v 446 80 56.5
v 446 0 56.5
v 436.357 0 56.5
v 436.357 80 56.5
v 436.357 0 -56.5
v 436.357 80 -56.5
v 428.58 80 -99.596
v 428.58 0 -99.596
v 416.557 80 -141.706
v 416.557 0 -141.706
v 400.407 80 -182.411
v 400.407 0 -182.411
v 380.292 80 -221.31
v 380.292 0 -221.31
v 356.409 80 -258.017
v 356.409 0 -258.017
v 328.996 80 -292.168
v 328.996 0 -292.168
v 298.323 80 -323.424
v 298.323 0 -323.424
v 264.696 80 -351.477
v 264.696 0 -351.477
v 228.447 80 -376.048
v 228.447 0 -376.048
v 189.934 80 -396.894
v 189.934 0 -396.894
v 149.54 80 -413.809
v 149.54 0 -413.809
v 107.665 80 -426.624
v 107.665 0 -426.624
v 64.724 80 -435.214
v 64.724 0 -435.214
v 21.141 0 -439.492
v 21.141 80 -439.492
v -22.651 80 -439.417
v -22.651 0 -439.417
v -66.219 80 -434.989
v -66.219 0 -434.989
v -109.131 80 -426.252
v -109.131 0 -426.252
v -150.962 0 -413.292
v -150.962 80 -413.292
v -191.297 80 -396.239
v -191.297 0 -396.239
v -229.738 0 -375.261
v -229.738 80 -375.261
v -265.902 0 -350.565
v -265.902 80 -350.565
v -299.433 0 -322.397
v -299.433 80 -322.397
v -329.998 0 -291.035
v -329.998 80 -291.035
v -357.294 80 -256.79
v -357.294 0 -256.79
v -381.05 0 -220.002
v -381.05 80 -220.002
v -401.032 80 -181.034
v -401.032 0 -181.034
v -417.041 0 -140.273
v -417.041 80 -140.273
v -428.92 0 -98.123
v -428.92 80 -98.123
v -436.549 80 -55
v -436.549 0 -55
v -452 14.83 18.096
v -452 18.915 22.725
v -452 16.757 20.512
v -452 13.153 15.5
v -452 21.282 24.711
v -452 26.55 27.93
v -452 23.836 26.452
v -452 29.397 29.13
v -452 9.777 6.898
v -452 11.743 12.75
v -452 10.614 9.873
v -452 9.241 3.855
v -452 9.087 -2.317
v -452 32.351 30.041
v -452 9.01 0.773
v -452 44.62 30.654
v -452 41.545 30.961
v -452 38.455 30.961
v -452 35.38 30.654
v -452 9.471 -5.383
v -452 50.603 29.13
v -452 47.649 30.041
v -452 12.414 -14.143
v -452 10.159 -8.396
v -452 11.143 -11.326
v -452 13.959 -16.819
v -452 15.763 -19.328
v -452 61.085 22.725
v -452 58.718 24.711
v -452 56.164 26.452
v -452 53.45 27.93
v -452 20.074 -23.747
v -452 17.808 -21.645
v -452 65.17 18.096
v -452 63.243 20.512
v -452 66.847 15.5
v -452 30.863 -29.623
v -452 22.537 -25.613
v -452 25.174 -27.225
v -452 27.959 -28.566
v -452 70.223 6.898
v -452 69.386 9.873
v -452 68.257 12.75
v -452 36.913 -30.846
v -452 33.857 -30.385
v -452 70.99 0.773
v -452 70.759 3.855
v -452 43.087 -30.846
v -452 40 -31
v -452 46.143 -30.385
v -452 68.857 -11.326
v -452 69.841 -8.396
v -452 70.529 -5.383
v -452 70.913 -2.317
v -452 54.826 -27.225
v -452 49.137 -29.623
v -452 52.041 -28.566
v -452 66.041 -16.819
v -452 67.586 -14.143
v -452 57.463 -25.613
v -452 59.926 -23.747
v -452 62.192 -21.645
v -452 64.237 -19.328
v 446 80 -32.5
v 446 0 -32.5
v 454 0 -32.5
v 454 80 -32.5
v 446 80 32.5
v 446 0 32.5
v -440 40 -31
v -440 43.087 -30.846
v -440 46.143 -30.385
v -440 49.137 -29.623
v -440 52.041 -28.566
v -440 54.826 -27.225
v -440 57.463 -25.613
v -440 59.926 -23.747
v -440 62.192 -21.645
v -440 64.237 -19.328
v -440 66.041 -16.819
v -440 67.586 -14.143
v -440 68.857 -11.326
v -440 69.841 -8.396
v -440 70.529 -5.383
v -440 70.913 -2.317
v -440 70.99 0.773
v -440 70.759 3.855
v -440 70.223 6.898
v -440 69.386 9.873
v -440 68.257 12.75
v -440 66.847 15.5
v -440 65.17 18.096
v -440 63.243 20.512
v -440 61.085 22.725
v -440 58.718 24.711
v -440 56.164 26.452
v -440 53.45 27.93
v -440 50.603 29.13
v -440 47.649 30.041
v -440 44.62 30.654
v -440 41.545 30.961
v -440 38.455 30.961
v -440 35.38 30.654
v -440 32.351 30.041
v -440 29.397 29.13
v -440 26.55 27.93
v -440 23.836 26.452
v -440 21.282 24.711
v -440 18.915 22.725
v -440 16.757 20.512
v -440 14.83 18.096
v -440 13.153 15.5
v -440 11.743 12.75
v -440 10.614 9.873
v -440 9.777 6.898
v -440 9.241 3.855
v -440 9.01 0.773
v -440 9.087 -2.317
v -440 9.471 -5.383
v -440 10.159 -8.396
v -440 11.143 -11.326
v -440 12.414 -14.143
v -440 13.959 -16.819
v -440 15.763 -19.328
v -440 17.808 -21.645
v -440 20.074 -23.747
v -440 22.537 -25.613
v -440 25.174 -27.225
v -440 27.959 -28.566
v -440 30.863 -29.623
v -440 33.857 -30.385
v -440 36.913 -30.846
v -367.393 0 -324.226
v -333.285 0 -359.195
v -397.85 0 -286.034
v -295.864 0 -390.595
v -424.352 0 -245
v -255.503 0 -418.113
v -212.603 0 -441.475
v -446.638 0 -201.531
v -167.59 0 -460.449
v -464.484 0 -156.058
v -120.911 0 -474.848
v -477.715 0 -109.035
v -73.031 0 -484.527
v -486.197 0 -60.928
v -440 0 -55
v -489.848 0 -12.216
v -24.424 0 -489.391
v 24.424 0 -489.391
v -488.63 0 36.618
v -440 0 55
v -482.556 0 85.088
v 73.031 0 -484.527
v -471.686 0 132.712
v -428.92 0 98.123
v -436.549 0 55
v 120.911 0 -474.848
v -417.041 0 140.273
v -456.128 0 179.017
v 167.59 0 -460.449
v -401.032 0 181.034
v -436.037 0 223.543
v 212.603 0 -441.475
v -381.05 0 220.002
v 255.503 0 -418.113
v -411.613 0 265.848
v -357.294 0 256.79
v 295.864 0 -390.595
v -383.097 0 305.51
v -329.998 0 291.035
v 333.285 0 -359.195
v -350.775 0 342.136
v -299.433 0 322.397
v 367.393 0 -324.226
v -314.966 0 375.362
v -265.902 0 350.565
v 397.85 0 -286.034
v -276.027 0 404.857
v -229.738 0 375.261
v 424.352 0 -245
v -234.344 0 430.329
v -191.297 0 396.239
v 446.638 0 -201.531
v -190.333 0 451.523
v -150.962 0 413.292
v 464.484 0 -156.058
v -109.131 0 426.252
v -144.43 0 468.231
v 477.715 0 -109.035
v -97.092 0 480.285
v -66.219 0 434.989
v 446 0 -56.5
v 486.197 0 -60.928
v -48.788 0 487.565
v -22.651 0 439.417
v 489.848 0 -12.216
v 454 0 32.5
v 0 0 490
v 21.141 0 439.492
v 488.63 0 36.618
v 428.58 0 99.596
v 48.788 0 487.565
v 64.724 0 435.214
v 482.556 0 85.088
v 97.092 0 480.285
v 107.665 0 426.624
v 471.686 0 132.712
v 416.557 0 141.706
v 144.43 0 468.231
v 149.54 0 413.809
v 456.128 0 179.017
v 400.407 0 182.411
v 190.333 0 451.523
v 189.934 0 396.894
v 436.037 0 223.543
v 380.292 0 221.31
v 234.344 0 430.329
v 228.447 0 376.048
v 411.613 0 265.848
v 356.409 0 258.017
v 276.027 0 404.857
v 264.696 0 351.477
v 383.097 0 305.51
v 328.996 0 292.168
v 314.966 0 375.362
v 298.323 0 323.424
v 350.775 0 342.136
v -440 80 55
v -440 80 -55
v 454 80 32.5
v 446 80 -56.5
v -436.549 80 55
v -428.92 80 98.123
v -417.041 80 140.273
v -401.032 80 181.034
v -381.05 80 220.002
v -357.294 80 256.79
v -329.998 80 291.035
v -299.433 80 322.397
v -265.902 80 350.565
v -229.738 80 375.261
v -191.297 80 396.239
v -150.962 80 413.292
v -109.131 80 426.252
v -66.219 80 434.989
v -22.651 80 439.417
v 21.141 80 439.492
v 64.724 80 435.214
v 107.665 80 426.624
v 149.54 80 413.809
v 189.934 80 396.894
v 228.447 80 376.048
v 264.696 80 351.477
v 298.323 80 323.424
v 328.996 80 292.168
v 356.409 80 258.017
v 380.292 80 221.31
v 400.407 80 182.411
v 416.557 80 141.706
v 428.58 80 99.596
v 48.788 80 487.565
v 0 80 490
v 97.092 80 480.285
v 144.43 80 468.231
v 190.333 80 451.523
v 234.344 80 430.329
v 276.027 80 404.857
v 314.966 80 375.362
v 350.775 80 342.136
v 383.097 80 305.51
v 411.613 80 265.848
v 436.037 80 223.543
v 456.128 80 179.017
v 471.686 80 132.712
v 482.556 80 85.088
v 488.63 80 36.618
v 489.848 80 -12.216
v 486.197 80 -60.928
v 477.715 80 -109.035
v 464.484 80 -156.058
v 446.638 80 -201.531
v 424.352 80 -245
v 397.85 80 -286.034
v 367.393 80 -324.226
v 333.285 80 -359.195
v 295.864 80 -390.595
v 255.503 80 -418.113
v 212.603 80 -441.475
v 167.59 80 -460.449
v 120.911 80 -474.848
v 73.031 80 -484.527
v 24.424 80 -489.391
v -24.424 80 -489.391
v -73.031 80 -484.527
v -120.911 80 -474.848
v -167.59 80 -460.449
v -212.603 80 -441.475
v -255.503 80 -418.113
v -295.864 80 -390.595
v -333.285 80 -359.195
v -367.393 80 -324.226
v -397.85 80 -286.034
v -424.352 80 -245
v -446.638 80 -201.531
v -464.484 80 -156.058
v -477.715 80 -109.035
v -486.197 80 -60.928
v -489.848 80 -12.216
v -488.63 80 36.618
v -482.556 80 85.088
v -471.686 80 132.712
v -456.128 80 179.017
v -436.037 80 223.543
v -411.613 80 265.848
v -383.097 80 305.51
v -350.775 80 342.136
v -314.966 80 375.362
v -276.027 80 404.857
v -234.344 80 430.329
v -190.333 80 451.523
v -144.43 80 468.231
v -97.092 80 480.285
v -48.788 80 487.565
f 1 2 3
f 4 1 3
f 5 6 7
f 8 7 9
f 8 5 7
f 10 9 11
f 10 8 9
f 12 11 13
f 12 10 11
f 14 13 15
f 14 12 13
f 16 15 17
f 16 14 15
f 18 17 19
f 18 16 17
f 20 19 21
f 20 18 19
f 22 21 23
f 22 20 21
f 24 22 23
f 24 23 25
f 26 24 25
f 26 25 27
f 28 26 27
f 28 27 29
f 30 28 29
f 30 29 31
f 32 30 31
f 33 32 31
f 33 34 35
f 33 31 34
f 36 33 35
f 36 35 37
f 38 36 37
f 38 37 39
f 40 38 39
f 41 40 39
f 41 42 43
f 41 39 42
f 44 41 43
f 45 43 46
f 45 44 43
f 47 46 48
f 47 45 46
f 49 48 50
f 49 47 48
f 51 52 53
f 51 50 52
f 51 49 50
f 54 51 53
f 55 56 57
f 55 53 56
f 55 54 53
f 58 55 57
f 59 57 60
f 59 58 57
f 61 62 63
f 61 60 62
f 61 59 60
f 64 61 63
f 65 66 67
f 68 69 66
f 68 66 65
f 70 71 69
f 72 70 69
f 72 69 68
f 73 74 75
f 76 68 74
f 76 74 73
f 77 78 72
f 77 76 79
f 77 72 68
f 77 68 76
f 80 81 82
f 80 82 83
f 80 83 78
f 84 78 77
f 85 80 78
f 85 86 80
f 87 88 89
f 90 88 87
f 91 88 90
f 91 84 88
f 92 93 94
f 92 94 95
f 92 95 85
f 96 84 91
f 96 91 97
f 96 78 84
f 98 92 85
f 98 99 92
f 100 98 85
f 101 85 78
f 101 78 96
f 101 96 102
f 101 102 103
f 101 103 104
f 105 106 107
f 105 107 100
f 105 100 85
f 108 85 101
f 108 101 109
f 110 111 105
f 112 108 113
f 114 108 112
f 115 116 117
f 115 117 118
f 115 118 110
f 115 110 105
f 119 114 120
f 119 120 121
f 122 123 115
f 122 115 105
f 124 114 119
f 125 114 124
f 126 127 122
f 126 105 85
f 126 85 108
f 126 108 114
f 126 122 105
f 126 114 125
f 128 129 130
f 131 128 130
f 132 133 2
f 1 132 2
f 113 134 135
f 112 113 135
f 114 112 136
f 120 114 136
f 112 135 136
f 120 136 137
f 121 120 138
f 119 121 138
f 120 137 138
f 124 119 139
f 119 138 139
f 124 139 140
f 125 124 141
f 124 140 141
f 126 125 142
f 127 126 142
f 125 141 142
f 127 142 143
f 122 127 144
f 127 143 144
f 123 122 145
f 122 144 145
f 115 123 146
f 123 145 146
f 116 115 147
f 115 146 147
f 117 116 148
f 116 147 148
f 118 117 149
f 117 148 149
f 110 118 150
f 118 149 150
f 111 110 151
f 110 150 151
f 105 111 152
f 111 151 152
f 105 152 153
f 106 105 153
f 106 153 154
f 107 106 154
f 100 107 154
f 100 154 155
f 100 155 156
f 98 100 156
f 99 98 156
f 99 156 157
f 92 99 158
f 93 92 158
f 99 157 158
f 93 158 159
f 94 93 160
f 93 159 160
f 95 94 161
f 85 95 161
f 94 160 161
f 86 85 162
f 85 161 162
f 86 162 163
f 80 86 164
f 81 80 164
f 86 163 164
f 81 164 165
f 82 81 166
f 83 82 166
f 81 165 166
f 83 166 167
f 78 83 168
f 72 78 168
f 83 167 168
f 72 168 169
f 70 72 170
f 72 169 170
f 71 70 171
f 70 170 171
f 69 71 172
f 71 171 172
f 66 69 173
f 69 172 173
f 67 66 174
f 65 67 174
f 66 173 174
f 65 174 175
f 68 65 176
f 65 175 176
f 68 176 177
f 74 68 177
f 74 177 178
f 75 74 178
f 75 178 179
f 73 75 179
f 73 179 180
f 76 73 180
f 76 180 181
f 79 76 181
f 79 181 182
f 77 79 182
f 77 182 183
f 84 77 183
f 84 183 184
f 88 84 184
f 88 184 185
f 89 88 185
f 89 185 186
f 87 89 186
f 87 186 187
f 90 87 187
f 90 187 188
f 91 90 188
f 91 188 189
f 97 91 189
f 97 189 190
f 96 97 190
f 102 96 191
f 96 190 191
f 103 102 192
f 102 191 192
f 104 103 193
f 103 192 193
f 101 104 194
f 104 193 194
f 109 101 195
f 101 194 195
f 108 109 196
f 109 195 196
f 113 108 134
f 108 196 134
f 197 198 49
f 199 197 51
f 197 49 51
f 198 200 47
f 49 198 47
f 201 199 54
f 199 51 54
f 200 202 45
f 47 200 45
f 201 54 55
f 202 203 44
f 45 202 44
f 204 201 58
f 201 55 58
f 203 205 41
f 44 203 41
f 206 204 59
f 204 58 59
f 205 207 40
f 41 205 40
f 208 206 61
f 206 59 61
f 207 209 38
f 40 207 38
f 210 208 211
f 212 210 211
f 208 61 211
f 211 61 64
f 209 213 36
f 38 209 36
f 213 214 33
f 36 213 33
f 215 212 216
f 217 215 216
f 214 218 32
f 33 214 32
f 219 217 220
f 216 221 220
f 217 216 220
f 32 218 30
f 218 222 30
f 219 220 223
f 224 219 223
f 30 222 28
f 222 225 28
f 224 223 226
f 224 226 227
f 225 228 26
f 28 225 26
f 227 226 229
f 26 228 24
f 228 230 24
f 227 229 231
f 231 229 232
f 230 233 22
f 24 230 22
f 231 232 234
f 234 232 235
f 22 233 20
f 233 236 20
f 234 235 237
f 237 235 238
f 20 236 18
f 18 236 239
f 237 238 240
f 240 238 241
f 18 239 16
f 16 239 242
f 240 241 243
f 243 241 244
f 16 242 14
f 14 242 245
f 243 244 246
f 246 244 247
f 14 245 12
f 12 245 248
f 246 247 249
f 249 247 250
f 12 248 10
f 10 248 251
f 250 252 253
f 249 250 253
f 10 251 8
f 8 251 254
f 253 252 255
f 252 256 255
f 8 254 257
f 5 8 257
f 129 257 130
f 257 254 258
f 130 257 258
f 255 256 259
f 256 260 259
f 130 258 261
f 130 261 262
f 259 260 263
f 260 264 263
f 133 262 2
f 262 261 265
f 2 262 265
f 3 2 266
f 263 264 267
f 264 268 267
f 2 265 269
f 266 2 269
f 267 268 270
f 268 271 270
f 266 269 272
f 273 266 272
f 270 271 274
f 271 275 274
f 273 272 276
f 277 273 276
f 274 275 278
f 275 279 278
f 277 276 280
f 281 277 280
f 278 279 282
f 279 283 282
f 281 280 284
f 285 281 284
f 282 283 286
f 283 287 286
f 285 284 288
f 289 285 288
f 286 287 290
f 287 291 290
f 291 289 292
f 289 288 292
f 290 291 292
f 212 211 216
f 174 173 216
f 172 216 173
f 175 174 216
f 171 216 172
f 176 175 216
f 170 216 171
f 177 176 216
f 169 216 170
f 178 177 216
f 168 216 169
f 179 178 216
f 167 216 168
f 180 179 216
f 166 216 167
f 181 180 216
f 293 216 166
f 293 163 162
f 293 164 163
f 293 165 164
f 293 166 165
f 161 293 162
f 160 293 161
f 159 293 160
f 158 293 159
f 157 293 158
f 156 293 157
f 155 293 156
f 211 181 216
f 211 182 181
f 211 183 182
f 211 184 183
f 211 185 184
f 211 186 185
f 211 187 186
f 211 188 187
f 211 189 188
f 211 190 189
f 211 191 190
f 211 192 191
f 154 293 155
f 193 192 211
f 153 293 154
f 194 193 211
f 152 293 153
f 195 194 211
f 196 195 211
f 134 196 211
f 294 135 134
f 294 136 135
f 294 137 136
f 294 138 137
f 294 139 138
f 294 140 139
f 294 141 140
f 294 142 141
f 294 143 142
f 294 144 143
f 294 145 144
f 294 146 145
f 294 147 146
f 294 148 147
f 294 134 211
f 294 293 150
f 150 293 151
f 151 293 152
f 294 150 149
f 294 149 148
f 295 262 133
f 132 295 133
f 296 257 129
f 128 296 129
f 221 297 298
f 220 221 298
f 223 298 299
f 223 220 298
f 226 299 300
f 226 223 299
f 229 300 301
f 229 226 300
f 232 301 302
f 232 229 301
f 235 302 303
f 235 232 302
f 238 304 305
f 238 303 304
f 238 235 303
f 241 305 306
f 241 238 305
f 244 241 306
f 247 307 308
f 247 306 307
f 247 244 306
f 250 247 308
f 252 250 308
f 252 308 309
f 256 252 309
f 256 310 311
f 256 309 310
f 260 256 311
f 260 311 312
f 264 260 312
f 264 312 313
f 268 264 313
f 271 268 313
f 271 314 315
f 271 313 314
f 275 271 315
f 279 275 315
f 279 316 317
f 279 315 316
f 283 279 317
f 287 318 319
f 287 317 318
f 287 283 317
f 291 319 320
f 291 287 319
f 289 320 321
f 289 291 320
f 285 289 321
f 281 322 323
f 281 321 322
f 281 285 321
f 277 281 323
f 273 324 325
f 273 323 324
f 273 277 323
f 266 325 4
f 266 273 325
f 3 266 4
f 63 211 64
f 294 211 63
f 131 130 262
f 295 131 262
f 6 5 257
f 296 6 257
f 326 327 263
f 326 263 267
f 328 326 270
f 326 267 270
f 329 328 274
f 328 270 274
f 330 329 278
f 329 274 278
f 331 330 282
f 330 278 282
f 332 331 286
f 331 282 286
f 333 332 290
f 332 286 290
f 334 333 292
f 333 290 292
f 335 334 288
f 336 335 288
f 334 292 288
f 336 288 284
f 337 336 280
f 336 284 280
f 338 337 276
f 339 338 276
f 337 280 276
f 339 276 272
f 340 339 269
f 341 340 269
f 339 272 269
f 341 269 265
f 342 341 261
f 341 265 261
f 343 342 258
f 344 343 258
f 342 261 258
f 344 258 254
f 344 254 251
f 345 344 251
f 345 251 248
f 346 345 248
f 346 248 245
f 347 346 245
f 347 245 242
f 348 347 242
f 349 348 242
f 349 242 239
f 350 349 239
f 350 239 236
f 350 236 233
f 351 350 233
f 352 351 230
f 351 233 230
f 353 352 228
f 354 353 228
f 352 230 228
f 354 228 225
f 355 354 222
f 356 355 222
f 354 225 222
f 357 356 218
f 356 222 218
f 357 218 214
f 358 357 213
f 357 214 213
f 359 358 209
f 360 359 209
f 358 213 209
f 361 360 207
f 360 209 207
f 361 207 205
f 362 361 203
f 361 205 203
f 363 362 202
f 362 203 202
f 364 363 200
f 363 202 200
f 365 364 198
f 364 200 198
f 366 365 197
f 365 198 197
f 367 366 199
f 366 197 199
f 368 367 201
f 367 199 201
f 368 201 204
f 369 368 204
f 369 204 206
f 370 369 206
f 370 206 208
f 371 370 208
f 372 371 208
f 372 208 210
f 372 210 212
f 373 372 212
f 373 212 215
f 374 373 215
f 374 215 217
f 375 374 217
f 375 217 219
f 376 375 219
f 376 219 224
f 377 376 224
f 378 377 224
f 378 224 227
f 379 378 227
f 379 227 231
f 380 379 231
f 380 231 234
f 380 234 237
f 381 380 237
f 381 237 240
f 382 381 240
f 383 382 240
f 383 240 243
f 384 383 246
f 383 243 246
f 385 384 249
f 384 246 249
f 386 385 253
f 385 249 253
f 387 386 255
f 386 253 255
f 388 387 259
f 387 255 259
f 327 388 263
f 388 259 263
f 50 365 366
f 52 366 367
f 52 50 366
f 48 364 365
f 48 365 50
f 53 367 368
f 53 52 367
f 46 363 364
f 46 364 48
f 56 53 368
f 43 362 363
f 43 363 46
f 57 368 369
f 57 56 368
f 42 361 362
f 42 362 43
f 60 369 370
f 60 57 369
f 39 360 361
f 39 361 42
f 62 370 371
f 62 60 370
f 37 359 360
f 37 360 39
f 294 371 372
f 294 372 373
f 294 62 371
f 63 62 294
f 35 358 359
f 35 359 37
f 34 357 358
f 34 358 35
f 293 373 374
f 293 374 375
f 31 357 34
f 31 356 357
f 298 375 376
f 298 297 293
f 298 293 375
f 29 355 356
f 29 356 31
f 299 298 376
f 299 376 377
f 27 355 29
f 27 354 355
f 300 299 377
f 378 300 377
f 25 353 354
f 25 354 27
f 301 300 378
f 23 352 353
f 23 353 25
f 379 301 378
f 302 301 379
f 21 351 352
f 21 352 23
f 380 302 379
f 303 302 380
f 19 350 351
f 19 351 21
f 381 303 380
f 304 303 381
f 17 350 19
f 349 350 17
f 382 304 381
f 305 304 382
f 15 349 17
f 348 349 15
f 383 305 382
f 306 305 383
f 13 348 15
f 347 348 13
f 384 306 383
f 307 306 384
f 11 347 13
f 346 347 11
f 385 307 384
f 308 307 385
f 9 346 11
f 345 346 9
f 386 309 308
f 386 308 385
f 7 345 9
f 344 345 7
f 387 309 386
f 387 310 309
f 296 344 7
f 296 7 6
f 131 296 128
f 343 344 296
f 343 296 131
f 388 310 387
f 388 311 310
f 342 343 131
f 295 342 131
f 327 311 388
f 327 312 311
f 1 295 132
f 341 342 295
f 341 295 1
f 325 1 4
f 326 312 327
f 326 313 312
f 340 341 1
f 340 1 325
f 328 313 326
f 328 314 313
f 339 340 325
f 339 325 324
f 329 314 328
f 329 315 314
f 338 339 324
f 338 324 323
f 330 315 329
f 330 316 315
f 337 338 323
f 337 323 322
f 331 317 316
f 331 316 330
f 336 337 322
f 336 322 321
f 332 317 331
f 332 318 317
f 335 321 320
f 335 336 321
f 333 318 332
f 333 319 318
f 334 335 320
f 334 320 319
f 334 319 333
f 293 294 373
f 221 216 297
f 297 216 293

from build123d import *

# Parameters (mm, degrees)
SKETCH1_R               = 490
SKETCH1_R_2             = 440
BOSS_EXTRUDE1_DEPTH     = 80
CUT_EXTRUDE2_DEPTH      = 698.567201064
CUT_EXTRUDE2_DEPTH_BACK = 698.567201064
SKETCH4_W               = 110
SKETCH4_H               = 80
CUT_EXTRUDE3_DEPTH      = 10
SKETCH5_R               = 31
CUT_EXTRUDE4_DEPTH      = 12


with BuildPart() as part:
    # Sketch1 → Boss-Extrude1 (new body)
    with BuildSketch(Plane(origin=(0, 0, 0), x_dir=(1, 0, 0), z_dir=(0, 1, 0))):
        with Locations(Location((0, 0, 0), (0, 0, 270))):
            Circle(SKETCH1_R)
        with Locations(Location((0, 0, 0), (0, 0, 270))):
            Circle(SKETCH1_R_2, mode=Mode.SUBTRACT)
    extrude(amount=BOSS_EXTRUDE1_DEPTH)

    # Sketch3 → Cut-Extrude2 (cut, two sides: drawn at the far end of the back side and taken through both)
    with BuildSketch(Plane(origin=(0, 80, 0), x_dir=(1, 0, 0), z_dir=(0, 1, 0)).offset(-CUT_EXTRUDE2_DEPTH_BACK)):
        Polygon((446, 32.5), (454, 32.5), (454, -32.5), (446, -32.5), (446, -56.5), (366.03, -56.5), (366.03, 56.5), (446, 56.5), align=None)
    extrude(amount=CUT_EXTRUDE2_DEPTH + CUT_EXTRUDE2_DEPTH_BACK, mode=Mode.SUBTRACT)

    # Sketch4 → Cut-Extrude3 (cut)
    with BuildSketch(Plane(origin=(-440, 0, 0), x_dir=(0, 0, -1), z_dir=(1, 0, 0))):
        with Locations((0, 40)):
            Rectangle(SKETCH4_W, SKETCH4_H)
    extrude(amount=CUT_EXTRUDE3_DEPTH, mode=Mode.SUBTRACT)

    # Sketch5 → Cut-Extrude4 (cut)
    with BuildSketch(Plane(origin=(-440, 0, 0), x_dir=(0, 0, -1), z_dir=(1, 0, 0))):
        with Locations((0, 40)):
            Circle(SKETCH5_R)
    extrude(amount=-CUT_EXTRUDE4_DEPTH, mode=Mode.SUBTRACT)


solid = part.part
